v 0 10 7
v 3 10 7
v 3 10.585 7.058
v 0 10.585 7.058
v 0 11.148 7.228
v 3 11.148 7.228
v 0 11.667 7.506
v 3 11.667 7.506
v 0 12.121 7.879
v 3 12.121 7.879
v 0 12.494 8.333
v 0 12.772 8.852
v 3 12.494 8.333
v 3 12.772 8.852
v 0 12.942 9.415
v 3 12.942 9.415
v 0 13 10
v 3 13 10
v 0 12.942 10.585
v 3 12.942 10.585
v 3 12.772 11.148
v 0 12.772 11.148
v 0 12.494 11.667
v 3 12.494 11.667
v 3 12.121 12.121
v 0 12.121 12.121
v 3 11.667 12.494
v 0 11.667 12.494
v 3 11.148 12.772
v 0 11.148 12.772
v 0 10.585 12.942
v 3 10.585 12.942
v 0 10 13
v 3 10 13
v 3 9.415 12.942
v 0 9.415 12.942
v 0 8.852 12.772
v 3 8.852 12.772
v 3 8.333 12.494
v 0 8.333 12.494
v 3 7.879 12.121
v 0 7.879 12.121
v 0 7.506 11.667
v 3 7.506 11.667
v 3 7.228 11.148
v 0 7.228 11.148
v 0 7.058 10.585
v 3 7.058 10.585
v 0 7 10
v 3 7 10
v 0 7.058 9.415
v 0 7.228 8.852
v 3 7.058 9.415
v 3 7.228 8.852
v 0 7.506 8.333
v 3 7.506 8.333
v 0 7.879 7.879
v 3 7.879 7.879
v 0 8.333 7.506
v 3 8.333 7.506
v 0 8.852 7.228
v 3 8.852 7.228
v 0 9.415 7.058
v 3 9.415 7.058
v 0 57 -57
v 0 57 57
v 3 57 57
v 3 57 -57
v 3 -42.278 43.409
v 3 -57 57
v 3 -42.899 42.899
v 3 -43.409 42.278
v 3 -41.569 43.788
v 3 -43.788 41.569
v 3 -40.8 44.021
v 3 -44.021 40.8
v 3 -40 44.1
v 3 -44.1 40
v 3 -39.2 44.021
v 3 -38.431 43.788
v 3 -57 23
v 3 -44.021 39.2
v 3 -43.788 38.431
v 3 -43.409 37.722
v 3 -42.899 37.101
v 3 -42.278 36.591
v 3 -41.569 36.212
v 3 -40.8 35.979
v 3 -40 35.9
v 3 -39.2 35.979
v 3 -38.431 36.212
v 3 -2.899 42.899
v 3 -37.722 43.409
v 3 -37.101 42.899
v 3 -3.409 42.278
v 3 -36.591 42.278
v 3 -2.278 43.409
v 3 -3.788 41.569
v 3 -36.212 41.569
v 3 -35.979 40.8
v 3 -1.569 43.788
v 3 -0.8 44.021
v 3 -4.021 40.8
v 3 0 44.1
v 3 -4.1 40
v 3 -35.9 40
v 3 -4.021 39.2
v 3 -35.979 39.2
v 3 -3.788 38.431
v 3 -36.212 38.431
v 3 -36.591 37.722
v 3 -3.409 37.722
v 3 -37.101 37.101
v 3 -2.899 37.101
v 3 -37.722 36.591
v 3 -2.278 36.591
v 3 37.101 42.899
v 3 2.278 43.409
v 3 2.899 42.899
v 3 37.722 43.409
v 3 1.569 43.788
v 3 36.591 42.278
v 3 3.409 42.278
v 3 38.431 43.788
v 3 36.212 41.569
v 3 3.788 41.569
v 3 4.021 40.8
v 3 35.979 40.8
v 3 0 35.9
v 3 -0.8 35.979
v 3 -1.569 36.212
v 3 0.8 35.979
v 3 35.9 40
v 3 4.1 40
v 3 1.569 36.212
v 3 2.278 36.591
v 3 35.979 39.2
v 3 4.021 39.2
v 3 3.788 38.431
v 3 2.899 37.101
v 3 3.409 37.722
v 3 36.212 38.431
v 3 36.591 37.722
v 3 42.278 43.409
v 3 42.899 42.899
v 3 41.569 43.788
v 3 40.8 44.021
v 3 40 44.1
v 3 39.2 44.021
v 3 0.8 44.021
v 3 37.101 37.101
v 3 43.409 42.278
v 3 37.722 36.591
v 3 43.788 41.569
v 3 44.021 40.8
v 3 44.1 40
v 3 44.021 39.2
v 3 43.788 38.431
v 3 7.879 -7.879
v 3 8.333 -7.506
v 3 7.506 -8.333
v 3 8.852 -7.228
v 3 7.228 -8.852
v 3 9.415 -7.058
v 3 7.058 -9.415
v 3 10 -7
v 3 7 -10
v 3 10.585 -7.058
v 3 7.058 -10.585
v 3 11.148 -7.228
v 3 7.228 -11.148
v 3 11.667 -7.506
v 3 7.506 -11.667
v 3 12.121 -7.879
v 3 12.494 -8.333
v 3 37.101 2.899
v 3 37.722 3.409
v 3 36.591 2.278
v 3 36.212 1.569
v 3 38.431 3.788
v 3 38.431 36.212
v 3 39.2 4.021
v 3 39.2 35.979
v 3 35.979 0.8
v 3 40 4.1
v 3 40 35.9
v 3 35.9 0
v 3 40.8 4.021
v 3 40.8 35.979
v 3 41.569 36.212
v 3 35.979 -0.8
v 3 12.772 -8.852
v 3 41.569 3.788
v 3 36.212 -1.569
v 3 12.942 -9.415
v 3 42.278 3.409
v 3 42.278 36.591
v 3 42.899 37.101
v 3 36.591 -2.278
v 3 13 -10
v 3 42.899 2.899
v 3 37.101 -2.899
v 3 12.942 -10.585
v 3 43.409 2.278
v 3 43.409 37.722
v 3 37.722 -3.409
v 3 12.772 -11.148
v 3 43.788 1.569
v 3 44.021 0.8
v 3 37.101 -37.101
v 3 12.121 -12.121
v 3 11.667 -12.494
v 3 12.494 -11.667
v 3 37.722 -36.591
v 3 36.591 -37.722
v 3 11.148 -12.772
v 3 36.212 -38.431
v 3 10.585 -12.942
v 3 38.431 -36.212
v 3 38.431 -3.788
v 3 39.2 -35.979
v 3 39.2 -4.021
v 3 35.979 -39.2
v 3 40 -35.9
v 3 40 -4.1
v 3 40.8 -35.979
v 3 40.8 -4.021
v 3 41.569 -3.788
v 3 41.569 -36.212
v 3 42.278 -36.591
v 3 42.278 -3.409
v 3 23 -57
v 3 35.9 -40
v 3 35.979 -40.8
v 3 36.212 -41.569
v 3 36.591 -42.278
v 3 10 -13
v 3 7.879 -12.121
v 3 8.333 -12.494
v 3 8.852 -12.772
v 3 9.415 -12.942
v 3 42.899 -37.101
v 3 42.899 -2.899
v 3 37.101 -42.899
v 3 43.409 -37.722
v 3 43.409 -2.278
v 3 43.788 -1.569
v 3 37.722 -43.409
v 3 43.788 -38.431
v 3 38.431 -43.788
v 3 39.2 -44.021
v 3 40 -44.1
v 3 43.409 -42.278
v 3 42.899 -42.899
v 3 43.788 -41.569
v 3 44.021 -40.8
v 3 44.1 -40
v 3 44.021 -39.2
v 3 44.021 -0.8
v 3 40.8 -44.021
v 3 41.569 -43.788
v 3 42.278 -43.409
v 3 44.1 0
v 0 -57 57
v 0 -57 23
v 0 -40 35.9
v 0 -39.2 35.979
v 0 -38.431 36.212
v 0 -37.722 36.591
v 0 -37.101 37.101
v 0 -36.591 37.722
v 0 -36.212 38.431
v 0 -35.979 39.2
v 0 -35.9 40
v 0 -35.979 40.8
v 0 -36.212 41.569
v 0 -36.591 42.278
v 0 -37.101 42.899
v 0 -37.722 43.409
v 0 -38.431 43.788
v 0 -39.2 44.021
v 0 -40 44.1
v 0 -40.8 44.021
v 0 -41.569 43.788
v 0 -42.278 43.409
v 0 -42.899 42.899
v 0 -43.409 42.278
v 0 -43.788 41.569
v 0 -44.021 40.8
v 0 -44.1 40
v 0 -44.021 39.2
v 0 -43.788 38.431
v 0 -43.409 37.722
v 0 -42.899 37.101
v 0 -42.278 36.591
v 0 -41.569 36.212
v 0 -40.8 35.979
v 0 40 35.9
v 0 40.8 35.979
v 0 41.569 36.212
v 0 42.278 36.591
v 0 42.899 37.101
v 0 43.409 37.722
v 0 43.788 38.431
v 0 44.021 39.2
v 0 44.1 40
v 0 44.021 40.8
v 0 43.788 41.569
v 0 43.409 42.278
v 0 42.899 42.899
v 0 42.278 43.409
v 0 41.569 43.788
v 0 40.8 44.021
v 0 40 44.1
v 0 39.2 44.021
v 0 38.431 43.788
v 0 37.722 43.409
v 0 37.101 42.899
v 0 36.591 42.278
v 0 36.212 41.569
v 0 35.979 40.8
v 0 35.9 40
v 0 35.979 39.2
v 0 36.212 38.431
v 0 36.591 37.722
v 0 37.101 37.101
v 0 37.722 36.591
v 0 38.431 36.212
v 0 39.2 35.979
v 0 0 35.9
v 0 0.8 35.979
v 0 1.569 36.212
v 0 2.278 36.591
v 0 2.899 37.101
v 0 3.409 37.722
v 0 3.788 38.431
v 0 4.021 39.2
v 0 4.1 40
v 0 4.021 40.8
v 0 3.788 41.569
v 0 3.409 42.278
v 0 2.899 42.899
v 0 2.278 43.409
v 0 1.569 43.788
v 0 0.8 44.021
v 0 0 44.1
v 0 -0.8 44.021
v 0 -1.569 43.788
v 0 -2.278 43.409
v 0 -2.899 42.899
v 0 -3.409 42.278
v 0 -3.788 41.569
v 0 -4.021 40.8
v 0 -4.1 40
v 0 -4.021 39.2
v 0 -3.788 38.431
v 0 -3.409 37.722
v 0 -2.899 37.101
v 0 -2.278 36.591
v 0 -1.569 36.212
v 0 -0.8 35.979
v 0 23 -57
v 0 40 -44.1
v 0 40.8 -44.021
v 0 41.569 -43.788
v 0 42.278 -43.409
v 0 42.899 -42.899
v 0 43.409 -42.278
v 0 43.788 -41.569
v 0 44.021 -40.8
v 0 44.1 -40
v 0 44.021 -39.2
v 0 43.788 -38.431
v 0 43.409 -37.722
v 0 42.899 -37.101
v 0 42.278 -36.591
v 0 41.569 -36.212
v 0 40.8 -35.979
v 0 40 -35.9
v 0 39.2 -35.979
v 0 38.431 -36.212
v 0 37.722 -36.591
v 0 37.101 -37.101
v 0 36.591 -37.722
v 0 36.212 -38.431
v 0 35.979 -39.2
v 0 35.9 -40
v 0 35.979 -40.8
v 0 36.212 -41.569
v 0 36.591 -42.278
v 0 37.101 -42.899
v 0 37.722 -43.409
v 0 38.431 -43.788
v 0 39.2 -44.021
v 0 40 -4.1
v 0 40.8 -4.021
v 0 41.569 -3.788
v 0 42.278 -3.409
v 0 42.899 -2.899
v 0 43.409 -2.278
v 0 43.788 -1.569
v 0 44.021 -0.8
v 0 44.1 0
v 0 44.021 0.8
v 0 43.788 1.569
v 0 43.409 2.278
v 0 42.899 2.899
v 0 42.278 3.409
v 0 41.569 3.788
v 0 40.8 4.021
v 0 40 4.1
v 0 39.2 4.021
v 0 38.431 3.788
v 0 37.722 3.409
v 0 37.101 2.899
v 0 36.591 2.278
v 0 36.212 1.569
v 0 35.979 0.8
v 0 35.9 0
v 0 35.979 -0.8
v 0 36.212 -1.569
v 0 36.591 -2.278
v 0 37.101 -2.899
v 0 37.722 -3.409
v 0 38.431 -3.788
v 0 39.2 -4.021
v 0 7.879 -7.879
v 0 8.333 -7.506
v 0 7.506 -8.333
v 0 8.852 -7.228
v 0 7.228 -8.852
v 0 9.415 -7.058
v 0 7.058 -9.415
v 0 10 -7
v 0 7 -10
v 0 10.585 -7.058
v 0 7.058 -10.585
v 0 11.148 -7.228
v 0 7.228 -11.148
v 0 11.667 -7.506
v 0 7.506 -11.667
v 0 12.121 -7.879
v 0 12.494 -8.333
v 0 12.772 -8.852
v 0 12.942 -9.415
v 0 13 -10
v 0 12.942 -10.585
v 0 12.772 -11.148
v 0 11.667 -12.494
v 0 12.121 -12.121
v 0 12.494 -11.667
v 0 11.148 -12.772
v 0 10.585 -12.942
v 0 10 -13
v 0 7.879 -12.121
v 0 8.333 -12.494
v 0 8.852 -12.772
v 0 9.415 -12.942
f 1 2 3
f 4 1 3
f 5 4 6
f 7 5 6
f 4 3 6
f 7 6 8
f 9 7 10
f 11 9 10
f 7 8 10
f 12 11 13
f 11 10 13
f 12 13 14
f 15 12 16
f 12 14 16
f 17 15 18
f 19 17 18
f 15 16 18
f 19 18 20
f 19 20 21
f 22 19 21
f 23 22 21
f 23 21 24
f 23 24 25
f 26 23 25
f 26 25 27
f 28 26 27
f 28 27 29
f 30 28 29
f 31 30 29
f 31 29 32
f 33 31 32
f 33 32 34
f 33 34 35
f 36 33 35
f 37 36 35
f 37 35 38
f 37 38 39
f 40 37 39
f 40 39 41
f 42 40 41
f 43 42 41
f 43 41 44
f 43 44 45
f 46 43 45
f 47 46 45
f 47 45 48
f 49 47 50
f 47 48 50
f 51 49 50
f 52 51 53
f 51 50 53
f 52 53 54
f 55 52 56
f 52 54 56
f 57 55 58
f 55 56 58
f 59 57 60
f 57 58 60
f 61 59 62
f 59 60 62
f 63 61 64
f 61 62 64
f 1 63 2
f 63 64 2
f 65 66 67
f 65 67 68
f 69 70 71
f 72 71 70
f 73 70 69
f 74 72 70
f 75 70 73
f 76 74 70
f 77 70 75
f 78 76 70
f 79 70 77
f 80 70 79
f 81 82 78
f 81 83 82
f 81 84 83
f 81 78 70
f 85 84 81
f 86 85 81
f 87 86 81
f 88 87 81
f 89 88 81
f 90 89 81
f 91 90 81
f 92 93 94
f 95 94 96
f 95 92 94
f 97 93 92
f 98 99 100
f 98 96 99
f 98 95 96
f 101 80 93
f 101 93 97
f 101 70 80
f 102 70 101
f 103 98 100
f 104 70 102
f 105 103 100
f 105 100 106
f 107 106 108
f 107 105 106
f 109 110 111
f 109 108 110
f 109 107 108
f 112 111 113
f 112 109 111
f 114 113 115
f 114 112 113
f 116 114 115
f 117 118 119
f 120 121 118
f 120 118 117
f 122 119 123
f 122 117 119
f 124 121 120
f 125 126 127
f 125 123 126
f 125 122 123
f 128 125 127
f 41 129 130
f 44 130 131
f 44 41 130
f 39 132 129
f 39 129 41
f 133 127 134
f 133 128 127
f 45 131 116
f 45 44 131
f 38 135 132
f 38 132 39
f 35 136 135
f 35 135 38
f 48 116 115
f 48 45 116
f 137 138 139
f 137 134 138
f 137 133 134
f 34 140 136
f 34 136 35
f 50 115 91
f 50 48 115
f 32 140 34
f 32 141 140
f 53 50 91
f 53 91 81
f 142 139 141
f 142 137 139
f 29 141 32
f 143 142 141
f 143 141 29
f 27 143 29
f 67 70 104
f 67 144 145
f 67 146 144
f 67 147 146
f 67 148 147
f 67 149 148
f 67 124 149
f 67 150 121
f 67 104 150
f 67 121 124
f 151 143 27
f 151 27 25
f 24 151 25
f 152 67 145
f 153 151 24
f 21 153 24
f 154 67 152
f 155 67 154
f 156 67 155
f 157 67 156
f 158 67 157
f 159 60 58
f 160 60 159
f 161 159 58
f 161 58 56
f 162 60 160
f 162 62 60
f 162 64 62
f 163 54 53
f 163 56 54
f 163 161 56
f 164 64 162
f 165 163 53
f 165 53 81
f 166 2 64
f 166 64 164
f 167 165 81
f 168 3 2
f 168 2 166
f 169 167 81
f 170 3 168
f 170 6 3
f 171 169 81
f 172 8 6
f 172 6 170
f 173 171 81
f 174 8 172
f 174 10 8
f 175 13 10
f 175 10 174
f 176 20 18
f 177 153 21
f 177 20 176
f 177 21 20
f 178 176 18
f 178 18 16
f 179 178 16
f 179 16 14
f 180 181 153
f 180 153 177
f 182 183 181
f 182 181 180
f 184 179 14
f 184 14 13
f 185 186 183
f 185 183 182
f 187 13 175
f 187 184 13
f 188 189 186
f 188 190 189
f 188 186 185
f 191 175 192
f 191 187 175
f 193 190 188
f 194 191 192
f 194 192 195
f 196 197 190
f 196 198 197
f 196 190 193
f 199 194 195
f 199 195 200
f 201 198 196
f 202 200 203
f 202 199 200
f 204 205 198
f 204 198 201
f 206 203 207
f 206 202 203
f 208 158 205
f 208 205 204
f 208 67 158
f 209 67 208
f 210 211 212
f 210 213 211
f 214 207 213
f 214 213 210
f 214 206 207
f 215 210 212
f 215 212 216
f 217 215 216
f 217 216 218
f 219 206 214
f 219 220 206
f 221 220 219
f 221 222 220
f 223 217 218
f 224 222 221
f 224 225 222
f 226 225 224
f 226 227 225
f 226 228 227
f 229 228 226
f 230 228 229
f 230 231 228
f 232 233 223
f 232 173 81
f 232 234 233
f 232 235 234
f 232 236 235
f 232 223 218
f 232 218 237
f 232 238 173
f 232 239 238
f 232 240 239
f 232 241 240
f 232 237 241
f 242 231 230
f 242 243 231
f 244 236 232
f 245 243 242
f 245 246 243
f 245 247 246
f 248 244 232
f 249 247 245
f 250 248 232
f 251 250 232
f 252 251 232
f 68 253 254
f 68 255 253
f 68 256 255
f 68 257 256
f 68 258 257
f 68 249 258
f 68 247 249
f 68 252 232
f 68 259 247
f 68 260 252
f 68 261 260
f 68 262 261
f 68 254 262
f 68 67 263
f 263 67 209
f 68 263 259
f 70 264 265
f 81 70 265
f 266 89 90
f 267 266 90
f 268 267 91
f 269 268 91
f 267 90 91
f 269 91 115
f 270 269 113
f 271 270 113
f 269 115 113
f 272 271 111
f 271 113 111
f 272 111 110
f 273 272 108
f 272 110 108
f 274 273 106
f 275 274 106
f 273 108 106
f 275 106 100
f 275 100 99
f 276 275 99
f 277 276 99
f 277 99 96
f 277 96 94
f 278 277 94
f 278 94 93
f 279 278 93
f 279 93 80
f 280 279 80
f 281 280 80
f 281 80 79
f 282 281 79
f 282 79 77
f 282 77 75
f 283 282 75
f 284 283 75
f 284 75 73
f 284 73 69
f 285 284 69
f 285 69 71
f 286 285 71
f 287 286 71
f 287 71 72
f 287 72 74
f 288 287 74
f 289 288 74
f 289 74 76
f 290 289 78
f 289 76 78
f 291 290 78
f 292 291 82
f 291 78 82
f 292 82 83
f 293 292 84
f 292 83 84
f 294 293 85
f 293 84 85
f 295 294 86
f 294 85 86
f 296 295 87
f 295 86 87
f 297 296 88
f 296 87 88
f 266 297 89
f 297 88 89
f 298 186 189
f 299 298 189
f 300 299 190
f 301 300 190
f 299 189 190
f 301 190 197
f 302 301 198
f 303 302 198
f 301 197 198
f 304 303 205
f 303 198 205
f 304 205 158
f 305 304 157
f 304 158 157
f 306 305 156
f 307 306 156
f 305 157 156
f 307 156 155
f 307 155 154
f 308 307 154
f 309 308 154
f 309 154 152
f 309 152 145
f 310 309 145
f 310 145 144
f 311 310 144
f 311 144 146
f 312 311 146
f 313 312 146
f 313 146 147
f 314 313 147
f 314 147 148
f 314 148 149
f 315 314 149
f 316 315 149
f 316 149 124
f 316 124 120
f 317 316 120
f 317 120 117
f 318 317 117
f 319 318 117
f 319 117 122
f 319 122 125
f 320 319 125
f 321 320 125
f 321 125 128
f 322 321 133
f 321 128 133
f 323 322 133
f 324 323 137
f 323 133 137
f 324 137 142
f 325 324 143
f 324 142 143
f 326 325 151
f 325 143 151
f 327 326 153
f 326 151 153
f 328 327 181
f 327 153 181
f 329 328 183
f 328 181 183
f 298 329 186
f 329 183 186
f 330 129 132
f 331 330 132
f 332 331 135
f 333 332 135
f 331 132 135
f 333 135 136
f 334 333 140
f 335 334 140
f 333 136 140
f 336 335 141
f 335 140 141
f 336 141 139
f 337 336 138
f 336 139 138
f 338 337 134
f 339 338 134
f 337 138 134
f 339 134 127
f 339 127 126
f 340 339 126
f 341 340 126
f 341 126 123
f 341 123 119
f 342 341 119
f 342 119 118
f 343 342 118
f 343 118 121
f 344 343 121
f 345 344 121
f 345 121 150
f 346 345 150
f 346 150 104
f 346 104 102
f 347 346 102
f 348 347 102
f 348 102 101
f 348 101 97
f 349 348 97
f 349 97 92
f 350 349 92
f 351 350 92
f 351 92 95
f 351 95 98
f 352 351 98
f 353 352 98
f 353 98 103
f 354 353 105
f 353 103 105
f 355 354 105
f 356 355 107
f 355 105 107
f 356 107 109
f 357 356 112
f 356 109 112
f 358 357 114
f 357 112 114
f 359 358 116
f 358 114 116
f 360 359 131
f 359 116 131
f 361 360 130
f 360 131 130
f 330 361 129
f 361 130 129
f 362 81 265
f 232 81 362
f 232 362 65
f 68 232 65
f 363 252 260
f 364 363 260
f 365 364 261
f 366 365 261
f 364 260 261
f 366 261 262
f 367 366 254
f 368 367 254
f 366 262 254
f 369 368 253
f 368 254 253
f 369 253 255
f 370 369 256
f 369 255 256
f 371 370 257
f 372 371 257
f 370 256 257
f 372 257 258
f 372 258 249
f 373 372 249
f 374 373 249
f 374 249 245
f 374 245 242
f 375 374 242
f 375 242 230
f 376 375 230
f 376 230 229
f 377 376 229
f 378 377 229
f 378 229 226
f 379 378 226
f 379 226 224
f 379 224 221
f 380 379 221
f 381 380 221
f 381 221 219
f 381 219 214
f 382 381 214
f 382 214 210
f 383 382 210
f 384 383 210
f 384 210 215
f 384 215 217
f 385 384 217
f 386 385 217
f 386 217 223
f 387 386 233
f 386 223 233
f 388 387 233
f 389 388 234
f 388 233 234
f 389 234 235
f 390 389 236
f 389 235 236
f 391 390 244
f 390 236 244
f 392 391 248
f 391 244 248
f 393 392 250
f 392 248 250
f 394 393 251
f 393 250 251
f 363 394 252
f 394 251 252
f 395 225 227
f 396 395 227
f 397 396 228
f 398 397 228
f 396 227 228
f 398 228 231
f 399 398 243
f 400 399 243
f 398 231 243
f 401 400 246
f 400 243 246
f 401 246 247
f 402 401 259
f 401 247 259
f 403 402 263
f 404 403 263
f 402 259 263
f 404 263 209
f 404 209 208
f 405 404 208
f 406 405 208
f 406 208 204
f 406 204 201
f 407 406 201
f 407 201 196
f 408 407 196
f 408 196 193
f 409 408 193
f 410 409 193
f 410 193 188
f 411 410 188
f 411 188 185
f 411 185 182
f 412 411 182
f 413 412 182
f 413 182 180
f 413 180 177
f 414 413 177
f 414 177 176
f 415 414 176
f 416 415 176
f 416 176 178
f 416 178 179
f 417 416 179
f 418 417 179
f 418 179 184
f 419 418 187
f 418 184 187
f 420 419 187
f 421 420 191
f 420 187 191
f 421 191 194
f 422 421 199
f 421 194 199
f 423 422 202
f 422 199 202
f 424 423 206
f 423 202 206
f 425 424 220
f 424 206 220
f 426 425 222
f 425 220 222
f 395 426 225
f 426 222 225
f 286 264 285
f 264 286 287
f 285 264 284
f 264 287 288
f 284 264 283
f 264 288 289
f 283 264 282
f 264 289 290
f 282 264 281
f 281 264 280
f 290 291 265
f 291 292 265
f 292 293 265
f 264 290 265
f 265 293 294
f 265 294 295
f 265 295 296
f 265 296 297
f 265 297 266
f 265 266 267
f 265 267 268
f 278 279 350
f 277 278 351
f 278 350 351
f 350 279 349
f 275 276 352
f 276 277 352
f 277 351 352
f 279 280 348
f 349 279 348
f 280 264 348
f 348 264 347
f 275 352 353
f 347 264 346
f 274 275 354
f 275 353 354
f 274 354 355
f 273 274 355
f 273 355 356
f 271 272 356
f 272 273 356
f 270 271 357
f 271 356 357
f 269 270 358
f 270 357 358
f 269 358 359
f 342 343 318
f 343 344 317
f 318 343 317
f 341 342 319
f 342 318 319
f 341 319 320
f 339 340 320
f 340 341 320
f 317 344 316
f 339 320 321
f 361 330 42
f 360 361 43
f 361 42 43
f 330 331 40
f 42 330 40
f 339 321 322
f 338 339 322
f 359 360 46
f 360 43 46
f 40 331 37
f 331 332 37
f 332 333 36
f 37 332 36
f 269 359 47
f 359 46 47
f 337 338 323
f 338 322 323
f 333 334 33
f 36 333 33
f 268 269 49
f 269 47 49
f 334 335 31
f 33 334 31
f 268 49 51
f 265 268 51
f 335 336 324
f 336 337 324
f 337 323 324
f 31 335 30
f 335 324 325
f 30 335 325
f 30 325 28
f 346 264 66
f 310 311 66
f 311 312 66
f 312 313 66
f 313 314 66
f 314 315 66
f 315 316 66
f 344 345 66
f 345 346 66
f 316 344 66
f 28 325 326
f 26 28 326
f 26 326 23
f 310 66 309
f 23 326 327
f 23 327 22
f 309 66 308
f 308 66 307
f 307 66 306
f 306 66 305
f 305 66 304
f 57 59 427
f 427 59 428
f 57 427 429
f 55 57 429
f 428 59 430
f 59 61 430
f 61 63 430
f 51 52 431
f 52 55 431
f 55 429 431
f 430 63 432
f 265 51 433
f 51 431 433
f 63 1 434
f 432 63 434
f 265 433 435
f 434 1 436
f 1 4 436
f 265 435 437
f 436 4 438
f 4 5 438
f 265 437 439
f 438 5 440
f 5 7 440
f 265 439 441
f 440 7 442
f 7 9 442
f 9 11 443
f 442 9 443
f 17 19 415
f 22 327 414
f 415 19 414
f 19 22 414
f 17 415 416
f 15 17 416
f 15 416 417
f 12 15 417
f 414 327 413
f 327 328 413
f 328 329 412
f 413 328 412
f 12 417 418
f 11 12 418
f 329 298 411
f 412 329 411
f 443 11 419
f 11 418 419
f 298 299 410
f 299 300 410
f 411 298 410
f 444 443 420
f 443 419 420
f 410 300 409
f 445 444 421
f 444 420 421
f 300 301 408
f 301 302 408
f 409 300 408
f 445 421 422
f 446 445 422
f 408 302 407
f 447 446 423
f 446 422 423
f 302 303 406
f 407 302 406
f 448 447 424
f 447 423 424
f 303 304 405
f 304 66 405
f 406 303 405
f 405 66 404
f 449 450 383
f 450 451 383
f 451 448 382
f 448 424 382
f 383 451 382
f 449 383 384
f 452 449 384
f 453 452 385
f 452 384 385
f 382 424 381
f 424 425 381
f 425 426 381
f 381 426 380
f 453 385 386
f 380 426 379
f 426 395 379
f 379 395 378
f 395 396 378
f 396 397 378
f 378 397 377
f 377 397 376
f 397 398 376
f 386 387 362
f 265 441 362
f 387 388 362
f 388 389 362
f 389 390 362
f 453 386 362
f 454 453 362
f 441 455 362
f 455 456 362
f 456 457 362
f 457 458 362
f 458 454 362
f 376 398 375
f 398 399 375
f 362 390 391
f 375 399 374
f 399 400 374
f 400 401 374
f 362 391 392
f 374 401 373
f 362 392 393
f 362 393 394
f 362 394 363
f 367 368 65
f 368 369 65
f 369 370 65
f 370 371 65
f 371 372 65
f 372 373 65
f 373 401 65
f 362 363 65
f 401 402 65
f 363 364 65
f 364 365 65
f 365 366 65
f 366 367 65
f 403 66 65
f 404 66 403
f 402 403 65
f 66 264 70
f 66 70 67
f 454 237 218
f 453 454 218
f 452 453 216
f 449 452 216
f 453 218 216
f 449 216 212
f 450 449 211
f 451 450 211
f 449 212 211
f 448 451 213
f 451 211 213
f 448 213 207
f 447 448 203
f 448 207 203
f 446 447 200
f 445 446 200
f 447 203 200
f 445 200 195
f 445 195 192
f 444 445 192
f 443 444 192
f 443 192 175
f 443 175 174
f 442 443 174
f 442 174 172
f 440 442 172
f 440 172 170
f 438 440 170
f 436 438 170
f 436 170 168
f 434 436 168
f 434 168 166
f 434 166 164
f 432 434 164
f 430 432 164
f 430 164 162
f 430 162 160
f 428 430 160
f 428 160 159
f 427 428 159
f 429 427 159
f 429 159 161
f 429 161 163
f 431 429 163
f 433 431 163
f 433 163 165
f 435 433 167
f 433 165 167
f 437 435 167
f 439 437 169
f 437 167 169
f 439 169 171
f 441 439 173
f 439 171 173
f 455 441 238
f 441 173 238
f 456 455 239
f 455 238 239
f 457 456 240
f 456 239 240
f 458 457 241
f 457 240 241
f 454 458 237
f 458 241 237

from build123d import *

# Parameters (mm, degrees)
SKETCH_1_W          = 114
SKETCH_1_H          = 114
EXTRUDE_266_DEPTH   = 3
SKETCH_2_R          = 4.1
CUT_EXTRUDE_1_DEPTH = 81.665977958
CUT_EXTRUDE_2_DEPTH = 81.665977958
SKETCH_4_R          = 3
CUT_EXTRUDE_3_DEPTH = 81.665977958


with BuildPart() as part:
    # Эскиз1 → Extrude 266 (new body)
    with BuildSketch(Plane(origin=(0, 0, 0), x_dir=(0, 0, -1), z_dir=(1, 0, 0))):
        Rectangle(SKETCH_1_W, SKETCH_1_H)
    extrude(amount=EXTRUDE_266_DEPTH)

    # Эскиз2 → Вырез-Вытянуть1 (cut, through all)
    with BuildSketch(Plane(origin=(3, 0, 0), x_dir=(0, 0, -1), z_dir=(1, 0, 0))):
        with Locations((0, 40)):
            Circle(SKETCH_2_R)
        with Locations((40, 40)):
            Circle(SKETCH_2_R)
        with Locations((-40, 0)):
            Circle(SKETCH_2_R)
        with Locations((-40, -40)):
            Circle(SKETCH_2_R)
        with Locations((-40, 40)):
            Circle(SKETCH_2_R)
    extrude(amount=-CUT_EXTRUDE_1_DEPTH, mode=Mode.SUBTRACT)

    # Эскиз3 → Вырез-Вытянуть2 (cut, through all)
    with BuildSketch(Plane(origin=(3, 0, 0), x_dir=(0, 0, -1), z_dir=(1, 0, 0))):
        Polygon((57, 23), (57, -57), (-23, -57), align=None)
    extrude(amount=-CUT_EXTRUDE_2_DEPTH, mode=Mode.SUBTRACT)

    # Эскиз4 → Вырез-Вытянуть3 (cut, through all)
    with BuildSketch(Plane(origin=(3, 0, 0), x_dir=(0, 0, -1), z_dir=(1, 0, 0))):
        with Locations((-10, 10)):
            Circle(SKETCH_4_R)
        with Locations((10, 10)):
            Circle(SKETCH_4_R)
    extrude(amount=-CUT_EXTRUDE_3_DEPTH, mode=Mode.SUBTRACT)


solid = part.part
